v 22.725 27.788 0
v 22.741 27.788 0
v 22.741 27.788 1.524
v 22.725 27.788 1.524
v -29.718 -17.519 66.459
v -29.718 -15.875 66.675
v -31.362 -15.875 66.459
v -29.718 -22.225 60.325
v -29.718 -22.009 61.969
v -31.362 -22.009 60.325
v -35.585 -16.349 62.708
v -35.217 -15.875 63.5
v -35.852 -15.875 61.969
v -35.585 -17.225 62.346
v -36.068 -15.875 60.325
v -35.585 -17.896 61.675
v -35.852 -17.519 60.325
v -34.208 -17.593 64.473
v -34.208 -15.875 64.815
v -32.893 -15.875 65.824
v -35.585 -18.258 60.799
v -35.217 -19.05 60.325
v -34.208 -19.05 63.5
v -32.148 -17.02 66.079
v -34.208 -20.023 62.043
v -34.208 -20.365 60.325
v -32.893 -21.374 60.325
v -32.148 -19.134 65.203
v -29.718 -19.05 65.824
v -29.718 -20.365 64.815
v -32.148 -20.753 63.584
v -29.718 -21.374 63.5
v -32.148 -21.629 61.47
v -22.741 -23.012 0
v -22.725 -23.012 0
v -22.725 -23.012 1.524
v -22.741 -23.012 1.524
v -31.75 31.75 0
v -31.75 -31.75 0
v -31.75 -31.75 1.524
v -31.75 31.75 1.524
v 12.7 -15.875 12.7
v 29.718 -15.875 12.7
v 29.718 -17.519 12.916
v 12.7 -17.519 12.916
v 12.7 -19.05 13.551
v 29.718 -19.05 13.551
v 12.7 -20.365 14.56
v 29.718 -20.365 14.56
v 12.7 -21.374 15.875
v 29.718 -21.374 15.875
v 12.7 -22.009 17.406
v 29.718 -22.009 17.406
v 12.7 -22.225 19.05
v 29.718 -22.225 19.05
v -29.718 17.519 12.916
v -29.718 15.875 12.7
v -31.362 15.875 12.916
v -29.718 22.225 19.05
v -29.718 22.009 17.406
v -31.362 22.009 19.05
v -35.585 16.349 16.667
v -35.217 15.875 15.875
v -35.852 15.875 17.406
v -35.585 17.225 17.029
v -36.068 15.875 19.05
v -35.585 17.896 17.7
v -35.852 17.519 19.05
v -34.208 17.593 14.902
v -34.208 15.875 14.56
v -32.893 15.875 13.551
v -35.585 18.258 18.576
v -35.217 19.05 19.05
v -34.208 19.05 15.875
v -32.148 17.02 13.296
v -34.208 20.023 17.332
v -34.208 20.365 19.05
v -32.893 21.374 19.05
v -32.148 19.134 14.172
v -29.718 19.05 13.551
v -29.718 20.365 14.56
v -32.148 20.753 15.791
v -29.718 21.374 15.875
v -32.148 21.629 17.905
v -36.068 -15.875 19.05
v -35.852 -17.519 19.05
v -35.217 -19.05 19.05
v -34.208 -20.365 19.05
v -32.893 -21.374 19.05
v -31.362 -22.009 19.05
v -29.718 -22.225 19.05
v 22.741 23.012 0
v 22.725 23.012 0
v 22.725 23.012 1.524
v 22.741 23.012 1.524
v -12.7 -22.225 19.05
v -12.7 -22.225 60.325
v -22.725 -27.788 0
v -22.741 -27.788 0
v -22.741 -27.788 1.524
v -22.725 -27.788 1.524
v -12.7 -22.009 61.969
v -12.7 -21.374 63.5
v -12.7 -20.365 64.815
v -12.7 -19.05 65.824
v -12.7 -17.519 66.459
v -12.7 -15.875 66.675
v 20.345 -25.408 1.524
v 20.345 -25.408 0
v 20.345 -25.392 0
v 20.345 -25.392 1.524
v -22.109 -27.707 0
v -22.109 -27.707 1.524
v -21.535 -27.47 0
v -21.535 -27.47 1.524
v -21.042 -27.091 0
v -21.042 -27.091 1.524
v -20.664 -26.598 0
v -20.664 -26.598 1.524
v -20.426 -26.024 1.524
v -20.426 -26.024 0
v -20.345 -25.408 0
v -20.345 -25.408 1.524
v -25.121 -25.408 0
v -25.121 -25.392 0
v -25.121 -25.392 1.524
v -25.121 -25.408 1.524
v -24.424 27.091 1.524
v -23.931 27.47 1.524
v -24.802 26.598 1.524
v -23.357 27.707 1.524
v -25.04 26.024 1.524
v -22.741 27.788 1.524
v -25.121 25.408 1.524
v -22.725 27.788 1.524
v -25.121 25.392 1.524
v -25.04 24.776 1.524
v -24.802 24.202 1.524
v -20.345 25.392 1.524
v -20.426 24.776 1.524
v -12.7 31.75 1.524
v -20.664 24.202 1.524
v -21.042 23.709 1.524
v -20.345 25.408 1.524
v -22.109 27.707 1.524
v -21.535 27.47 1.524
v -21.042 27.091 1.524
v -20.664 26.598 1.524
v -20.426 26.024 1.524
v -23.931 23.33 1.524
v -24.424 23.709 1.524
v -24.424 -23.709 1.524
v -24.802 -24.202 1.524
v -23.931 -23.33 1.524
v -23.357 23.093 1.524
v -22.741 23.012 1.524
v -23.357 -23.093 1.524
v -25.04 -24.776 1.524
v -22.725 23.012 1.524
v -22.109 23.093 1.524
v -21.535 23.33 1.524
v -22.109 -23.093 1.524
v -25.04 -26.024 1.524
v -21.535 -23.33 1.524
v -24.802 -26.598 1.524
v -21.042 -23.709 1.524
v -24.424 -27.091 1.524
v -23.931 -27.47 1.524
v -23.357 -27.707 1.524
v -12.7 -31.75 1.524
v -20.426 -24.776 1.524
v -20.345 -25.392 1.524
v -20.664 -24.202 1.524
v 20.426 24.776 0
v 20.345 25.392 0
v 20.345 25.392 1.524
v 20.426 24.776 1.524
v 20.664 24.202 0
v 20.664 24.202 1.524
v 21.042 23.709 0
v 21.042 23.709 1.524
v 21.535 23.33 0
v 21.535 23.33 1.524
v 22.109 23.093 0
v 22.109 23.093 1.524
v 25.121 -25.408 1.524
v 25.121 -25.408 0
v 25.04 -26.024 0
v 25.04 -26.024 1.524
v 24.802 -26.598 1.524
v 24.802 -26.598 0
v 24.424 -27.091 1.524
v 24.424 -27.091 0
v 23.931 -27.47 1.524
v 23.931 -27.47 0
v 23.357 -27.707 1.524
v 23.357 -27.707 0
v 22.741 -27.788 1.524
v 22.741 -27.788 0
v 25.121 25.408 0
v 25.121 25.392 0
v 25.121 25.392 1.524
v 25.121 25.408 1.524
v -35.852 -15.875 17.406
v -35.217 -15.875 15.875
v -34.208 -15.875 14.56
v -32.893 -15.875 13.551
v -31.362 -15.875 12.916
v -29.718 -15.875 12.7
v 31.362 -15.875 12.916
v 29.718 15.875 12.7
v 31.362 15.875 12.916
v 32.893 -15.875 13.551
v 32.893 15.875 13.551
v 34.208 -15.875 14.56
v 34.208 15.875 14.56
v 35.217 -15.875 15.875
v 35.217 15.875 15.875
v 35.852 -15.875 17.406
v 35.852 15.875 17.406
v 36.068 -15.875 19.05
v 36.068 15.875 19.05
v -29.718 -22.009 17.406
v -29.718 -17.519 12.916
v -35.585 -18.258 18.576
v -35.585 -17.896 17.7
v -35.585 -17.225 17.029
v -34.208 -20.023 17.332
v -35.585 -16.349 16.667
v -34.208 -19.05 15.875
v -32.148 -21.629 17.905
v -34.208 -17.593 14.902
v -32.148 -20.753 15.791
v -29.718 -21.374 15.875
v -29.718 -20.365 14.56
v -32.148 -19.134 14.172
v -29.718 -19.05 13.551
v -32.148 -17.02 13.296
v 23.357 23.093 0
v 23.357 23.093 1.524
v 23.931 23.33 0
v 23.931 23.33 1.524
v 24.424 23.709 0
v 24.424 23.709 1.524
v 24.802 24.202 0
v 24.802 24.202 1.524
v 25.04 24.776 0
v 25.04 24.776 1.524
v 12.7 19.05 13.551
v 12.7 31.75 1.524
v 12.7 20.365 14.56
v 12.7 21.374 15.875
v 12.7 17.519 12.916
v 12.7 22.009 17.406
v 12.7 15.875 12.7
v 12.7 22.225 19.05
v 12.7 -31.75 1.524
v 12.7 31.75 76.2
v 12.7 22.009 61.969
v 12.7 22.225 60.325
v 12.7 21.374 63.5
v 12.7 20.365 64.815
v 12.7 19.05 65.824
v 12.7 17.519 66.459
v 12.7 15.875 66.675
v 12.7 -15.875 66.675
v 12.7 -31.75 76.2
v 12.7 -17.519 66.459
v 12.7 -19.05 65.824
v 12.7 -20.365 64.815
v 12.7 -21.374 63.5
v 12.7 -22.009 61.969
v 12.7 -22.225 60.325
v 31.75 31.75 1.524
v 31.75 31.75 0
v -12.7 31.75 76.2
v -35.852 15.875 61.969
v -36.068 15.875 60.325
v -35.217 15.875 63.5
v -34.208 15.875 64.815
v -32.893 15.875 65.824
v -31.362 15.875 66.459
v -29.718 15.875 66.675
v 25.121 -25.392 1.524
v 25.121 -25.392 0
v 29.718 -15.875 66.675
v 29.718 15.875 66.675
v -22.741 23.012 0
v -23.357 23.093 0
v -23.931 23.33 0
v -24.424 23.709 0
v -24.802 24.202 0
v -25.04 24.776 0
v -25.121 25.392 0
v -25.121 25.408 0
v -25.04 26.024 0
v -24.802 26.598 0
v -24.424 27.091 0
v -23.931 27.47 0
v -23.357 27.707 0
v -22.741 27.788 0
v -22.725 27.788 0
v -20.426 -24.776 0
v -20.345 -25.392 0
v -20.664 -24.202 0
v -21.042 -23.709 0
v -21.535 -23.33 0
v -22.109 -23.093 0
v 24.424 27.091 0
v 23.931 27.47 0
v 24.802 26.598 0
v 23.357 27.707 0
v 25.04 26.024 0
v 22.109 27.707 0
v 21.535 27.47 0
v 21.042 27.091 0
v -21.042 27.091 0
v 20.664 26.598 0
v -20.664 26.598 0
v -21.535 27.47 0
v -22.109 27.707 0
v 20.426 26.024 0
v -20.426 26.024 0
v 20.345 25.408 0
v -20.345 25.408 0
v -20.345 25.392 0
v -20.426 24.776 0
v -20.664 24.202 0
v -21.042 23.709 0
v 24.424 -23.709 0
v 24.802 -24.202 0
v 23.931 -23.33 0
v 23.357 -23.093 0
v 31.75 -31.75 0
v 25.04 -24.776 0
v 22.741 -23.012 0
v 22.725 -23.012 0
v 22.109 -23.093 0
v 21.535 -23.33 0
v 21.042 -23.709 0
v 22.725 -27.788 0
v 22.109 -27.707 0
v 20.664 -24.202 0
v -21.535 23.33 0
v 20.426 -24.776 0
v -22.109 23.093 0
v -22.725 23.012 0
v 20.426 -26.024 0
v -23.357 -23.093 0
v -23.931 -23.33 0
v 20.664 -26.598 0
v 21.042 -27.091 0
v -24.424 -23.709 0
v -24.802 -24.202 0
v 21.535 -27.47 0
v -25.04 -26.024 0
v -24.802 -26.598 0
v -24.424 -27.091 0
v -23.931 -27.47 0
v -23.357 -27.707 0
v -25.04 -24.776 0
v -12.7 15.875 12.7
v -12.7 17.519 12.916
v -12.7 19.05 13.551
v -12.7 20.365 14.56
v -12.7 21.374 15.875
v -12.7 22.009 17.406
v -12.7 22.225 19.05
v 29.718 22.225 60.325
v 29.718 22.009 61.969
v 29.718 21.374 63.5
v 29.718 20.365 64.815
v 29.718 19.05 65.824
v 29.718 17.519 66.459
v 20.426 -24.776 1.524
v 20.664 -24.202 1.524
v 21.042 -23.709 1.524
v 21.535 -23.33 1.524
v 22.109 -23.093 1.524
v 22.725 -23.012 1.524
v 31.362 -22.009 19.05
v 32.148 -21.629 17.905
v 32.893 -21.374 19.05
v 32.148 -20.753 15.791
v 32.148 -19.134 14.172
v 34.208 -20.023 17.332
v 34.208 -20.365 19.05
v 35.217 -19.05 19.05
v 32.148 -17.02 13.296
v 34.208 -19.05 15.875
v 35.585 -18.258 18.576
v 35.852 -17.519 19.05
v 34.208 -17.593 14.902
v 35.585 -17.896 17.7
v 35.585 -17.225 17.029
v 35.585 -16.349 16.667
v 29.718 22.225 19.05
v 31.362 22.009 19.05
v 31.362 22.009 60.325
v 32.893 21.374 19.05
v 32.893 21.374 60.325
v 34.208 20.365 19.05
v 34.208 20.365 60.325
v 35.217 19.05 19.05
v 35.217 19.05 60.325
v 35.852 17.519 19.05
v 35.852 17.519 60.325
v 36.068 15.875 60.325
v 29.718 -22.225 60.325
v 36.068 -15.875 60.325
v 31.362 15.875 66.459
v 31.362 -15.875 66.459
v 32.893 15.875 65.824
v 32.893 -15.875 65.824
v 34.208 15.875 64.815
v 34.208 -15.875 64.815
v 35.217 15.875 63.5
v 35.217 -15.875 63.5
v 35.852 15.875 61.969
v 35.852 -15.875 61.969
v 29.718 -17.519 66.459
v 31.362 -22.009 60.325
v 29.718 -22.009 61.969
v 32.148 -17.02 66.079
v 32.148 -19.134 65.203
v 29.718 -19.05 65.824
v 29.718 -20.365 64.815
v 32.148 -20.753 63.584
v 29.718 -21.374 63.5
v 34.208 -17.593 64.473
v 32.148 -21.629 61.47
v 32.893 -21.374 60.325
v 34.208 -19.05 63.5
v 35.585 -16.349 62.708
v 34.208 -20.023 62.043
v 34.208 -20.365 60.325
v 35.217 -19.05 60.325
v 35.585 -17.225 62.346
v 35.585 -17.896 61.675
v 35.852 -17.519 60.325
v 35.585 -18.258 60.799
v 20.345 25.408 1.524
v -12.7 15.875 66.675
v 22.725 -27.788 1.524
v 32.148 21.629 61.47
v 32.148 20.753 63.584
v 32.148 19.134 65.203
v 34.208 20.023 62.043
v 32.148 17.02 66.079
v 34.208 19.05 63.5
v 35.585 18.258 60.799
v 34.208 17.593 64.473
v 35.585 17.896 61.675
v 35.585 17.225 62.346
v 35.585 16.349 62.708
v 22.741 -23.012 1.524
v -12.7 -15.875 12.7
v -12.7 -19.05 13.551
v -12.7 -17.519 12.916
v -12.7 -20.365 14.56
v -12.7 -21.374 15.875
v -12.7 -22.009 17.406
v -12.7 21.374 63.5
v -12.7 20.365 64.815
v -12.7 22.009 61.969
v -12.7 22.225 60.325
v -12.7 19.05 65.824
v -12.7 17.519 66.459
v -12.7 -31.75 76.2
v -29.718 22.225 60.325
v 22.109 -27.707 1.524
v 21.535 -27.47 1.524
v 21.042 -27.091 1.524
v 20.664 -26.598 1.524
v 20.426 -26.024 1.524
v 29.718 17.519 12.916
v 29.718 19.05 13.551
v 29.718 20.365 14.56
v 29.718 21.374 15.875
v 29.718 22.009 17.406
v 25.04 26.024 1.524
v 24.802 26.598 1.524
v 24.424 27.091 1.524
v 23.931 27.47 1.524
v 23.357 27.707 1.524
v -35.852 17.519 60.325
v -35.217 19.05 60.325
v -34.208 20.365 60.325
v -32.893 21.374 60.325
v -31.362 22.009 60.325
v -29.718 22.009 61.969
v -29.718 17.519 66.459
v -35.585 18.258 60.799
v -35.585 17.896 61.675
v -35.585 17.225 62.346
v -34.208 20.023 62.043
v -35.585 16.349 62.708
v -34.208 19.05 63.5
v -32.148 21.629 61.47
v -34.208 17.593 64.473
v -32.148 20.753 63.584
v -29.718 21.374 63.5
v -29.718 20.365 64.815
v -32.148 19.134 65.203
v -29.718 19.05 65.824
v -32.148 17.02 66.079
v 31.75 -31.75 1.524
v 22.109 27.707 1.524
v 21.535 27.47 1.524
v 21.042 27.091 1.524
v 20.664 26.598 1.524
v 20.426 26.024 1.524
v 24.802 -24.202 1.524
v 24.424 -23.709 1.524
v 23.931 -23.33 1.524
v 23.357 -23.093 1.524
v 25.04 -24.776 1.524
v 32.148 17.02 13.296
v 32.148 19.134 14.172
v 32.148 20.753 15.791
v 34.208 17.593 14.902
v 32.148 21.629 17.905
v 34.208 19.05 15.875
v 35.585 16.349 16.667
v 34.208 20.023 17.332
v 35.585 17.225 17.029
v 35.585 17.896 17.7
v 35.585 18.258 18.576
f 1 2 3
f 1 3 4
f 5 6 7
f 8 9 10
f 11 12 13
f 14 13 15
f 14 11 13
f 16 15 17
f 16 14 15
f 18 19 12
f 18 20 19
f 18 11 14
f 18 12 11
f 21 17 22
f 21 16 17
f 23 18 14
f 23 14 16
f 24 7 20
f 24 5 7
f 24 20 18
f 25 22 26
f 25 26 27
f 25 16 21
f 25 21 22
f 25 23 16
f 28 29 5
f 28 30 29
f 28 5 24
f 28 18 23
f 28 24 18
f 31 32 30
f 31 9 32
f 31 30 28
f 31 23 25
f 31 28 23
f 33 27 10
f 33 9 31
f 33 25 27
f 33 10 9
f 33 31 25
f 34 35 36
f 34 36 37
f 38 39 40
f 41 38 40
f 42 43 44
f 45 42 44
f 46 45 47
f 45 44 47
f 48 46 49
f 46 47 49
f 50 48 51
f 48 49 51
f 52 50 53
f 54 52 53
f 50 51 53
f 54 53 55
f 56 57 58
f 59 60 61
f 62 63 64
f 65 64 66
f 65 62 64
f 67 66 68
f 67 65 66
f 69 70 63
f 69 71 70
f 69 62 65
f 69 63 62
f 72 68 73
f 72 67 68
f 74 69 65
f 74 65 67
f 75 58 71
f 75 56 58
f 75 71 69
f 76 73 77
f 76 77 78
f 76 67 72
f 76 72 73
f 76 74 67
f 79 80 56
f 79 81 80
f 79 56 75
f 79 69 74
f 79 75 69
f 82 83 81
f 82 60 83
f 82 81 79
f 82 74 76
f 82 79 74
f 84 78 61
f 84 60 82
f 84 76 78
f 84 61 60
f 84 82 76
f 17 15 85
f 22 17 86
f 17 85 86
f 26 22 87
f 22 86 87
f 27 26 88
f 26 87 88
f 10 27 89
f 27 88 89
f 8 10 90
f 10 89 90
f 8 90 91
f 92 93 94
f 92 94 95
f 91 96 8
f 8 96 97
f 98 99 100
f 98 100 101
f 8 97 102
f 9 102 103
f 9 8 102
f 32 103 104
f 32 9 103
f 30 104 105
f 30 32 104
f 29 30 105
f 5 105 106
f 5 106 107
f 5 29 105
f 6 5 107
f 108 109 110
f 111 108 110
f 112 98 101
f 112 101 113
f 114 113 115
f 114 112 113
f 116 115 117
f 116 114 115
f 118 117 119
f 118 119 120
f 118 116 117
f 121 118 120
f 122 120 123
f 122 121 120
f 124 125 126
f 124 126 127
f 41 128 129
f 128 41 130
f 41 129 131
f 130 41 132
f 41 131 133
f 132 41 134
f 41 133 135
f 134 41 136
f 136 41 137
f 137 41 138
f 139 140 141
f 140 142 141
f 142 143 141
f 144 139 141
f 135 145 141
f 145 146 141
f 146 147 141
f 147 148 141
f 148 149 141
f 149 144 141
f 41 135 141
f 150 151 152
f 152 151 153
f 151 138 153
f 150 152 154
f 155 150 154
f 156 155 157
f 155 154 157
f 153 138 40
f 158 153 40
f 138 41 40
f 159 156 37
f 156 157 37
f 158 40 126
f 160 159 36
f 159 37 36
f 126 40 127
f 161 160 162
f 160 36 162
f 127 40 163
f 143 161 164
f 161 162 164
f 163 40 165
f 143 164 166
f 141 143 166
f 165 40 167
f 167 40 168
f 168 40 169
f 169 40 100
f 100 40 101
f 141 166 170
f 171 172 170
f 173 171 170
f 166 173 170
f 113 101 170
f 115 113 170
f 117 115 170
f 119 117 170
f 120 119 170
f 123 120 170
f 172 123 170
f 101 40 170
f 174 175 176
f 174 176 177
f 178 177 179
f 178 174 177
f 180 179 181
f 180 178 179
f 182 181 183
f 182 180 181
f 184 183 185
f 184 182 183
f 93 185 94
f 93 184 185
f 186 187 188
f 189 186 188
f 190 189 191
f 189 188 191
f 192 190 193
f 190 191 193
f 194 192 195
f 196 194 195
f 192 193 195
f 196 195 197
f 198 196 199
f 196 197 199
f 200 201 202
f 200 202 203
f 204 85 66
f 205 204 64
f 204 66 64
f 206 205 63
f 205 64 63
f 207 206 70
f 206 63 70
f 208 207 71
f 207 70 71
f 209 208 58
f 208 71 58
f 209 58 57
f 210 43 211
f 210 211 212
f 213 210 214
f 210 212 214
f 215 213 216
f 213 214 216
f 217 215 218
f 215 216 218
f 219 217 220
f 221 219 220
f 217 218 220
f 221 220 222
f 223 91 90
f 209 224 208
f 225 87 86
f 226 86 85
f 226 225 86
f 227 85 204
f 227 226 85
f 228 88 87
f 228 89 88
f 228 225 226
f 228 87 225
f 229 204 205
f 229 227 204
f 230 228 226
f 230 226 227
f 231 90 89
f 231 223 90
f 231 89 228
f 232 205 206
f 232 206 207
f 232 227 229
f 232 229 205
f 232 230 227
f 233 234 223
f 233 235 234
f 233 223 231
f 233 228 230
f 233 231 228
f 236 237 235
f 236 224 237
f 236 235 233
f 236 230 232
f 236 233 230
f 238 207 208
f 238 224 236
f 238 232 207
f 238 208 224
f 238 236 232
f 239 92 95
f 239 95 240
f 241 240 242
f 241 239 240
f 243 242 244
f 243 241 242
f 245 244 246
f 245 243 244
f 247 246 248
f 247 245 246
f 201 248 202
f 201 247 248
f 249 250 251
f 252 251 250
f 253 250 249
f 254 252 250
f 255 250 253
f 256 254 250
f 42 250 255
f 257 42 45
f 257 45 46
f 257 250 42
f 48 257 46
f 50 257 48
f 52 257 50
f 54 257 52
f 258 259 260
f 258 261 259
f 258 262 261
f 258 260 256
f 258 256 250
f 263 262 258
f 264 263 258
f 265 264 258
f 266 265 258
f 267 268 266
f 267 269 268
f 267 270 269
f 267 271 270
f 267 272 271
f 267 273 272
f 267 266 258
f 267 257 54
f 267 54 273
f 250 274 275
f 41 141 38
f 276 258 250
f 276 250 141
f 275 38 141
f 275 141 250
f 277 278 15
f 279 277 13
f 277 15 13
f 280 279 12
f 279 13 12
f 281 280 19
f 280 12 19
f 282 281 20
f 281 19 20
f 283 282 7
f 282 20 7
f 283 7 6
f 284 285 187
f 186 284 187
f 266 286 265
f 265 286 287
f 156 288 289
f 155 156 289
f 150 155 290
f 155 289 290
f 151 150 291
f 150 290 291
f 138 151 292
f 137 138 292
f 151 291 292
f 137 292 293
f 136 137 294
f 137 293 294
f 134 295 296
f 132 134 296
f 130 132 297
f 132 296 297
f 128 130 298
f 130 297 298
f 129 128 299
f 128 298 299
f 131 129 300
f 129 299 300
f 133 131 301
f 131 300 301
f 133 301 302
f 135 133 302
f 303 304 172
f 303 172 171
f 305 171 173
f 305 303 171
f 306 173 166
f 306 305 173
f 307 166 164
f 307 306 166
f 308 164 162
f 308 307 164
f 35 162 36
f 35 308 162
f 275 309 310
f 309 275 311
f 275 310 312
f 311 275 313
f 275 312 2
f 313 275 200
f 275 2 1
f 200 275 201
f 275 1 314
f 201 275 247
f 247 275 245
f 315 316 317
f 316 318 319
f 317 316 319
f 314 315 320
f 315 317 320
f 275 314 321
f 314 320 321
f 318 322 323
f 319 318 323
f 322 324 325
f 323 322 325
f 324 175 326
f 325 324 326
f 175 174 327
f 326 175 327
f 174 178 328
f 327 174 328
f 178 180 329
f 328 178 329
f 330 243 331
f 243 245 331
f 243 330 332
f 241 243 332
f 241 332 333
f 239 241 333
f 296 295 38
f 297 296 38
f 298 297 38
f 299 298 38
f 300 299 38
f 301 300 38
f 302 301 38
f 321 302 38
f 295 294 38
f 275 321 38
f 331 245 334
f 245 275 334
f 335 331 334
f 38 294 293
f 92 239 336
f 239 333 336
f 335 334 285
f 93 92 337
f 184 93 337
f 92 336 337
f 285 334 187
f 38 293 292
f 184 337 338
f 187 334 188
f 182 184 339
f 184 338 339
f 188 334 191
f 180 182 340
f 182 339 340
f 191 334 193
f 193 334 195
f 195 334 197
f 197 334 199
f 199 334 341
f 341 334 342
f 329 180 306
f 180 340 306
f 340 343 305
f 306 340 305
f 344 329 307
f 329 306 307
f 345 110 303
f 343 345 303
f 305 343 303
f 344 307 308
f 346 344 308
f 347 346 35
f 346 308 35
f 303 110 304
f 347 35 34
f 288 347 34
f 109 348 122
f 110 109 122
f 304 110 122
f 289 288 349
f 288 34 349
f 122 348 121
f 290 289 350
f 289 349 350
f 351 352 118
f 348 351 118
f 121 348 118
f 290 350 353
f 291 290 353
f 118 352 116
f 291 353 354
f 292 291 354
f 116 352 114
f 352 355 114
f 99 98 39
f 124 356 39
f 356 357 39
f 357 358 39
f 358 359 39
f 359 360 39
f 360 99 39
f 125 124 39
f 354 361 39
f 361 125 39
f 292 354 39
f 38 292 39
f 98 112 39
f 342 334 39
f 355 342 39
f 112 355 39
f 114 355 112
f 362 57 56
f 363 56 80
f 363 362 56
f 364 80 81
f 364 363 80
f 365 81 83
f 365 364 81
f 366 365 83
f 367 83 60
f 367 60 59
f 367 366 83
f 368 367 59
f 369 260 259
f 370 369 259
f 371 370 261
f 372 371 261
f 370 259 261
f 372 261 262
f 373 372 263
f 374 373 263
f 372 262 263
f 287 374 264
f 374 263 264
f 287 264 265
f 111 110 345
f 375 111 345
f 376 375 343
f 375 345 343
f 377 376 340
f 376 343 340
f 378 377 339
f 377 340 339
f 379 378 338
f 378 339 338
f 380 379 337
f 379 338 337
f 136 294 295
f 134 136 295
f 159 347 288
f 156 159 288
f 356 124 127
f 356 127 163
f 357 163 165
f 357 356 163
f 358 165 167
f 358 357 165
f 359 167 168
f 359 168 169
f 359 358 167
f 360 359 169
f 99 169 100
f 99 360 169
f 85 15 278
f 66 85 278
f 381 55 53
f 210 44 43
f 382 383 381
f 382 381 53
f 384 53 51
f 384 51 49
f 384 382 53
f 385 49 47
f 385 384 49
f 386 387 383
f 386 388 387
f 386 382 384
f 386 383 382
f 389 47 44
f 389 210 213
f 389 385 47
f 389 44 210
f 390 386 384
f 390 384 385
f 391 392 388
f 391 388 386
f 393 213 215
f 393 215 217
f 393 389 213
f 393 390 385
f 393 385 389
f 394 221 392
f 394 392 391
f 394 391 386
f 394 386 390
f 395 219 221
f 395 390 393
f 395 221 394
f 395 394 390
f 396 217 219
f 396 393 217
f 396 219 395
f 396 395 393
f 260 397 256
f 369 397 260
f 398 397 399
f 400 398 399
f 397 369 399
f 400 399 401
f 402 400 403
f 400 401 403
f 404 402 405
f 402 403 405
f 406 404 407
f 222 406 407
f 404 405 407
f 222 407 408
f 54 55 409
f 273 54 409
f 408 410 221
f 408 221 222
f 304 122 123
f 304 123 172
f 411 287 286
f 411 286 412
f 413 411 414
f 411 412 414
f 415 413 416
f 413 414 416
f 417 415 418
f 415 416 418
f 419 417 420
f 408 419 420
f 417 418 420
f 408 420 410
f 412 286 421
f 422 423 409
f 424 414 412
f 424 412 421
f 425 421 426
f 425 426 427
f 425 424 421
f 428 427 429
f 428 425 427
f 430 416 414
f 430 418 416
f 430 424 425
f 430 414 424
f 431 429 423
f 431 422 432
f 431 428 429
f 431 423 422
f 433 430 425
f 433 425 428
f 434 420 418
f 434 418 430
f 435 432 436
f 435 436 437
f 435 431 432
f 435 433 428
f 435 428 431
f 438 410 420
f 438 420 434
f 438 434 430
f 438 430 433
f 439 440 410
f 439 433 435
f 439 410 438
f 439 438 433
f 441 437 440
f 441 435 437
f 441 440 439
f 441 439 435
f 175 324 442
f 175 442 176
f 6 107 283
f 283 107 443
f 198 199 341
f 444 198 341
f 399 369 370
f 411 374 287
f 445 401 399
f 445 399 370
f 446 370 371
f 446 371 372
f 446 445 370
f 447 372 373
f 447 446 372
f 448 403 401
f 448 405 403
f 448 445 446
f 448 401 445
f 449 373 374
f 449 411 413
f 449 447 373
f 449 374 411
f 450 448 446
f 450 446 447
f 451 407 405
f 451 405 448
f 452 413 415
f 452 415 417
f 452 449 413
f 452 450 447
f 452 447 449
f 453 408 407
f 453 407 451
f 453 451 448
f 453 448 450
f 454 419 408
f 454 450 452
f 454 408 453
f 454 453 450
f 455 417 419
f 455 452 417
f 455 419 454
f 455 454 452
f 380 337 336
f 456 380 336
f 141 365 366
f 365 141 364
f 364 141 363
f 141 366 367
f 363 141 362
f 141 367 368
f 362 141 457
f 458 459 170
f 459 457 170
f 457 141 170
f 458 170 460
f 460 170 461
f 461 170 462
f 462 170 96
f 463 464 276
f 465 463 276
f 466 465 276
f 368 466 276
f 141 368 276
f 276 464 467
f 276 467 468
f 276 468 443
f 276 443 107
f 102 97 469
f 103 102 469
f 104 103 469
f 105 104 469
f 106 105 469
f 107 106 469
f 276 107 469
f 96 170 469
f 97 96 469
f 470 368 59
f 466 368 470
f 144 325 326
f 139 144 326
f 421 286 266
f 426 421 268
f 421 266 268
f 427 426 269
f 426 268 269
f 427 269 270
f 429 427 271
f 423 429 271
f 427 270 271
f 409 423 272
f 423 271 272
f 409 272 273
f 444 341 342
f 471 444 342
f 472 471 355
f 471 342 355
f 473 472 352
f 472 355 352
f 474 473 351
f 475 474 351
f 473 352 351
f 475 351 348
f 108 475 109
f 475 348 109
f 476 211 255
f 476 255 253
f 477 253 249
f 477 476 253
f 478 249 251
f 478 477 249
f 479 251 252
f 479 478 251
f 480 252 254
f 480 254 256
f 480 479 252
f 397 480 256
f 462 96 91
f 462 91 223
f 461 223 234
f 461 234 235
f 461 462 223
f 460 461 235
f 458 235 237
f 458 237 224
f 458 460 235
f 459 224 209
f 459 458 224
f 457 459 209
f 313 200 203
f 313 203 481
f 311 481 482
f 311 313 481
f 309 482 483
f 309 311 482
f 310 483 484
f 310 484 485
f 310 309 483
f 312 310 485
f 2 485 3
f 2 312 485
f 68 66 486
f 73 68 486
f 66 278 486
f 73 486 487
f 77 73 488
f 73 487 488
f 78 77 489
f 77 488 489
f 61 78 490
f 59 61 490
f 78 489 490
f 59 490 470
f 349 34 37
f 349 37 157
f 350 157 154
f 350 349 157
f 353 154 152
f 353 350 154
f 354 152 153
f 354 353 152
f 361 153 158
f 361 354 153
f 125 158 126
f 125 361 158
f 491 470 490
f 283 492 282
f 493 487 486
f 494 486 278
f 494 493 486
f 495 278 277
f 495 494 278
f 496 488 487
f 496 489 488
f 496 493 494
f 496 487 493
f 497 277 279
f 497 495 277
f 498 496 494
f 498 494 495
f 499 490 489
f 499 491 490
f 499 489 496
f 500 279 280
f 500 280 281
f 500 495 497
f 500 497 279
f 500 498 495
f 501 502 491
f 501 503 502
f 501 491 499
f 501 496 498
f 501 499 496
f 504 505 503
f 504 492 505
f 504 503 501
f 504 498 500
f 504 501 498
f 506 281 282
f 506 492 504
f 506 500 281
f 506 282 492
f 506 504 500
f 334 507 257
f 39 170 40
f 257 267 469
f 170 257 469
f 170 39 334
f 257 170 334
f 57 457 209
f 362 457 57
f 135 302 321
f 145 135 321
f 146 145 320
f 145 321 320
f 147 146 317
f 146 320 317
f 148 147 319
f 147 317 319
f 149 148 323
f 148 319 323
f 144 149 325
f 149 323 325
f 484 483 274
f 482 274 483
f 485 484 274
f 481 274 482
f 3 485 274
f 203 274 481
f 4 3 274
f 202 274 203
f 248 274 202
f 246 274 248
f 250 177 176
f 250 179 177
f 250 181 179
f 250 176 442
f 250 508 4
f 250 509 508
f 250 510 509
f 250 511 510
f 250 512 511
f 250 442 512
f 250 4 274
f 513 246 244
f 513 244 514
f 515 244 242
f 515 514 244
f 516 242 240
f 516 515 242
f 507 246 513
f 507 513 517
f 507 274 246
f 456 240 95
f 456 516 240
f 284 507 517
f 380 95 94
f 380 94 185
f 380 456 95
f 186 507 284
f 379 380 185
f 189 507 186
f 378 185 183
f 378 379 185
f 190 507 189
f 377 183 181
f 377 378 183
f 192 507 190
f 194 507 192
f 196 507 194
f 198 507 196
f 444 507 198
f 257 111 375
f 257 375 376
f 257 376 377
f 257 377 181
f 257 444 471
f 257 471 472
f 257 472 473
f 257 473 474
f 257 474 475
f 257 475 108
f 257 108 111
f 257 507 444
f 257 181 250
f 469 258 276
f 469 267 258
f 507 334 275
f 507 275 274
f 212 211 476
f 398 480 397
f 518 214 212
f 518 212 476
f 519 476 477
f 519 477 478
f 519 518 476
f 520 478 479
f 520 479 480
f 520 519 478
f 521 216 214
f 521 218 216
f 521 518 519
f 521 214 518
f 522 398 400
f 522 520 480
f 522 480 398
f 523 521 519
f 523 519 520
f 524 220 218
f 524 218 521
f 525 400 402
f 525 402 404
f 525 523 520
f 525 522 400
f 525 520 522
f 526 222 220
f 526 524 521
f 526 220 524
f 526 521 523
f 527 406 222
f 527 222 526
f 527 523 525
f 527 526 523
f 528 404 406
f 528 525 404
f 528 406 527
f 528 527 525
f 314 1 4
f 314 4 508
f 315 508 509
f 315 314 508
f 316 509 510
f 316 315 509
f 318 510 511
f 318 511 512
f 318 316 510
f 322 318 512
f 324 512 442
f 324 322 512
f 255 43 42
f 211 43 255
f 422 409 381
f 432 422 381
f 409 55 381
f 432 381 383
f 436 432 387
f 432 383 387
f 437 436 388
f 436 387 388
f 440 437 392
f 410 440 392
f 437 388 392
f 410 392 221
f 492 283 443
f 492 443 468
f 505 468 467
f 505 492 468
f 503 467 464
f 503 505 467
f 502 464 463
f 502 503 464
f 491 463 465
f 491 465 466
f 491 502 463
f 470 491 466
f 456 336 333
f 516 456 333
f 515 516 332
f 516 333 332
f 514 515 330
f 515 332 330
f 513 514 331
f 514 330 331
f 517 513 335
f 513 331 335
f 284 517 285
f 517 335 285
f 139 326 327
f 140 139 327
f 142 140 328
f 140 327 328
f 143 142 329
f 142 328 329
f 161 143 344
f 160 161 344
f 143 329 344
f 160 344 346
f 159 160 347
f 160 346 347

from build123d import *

# Parameters (mm, degrees)
F0_W             = 12.7
F0_H             = 74.676
F0_W_2           = 19.05
F0_H_2           = 1.524
F1_DEPTH         = 31.75
F3_W             = 44.45
F3_H             = 53.975
F4_DEPTH         = 36.068
F6_DEPTH         = 1.524
F6_COPIES2_COUNT = 2
F6_COPIES2_PITCH = 68.174755
F7_R             = 6.35
F8_R             = 6.35


# Not quite as in the source:
# - a pattern or mirror of a feature is missing from the dataset's text; its kind, count and spacing are read off the source's solid


with BuildPart() as f1:
    # F0 (on Front) → F1 (new body, symmetric)
    with BuildSketch(Plane.XZ):
        with Locations((-6.35, 38.862)):
            Rectangle(F0_W, F0_H)
        with Locations((-22.225, 0.762)):
            Rectangle(F0_W_2, F0_H_2)
        with Locations((-6.35, 0.762)):
            Rectangle(F0_W, F0_H_2)
    extrude(amount=F1_DEPTH, both=True)

    # F2: F1 across plane


with BuildPart() as f1_1:
    add(f1.part)
    add(f1.part.mirror(Plane.YZ))

    # F3 (on Right) → F4 (join, symmetric)
    with BuildSketch(Plane.YZ):
        with Locations((0, 39.6875)):
            Rectangle(F3_W, F3_H)
    extrude(amount=F4_DEPTH, both=True)

    # F5 (on face) → F6 (cut, through all)
    with BuildSketch(Plane(origin=(0, 0, 0), x_dir=(1, 0, 0), z_dir=(0, 0, -1))):
        with BuildLine():
            Line((22.72538, 23.0116418839), (22.74062, 23.0116418839))
            ThreePointArc((22.74062, 23.0116418839), (24.4235199971, 23.7087218868), (25.1206, 25.3916218839))
            Line((25.1206, 25.3916218839), (25.1206, 25.4083781161))
            ThreePointArc((25.1206, 25.4083781161), (24.4235199971, 27.0912781132), (22.74062, 27.7883581161))
            Line((22.74062, 27.7883581161), (22.72538, 27.7883581161))
            ThreePointArc((22.72538, 27.7883581161), (21.0424800029, 27.0912781132), (20.3454, 25.4083781161))
            Line((20.3454, 25.4083781161), (20.3454, 25.3916218839))
            ThreePointArc((20.3454, 25.3916218839), (21.0424800029, 23.7087218868), (22.72538, 23.0116418839))
        make_face()
    f6 = extrude(amount=-F6_DEPTH, mode=Mode.SUBTRACT)

    # F6_copies: F6 across plane
    add(f6.mirror(Plane.ZX), mode=Mode.SUBTRACT)

    # F6_copies1: F6 across plane
    add(f6.mirror(Plane(origin=(0, 0, 0), x_dir=(0, 0, -1), z_dir=(-1, 0, 0))), mode=Mode.SUBTRACT)

    # F6_copies2: F6 ×2
    with Locations(*[Vector(-0.666903758, 0.7451438637, 0) * (i * F6_COPIES2_PITCH) for i in range(1, F6_COPIES2_COUNT)]):
        add(f6, mode=Mode.SUBTRACT)

    # F7
    f7_edges = [f1_1.edges().sort_by_distance(p)[0] for p in [
        (24.384, -22.225, 66.675),
        (24.384, 22.225, 66.675),
        (24.384, 22.225, 12.7),
        (24.384, -22.225, 12.7),
        (-24.384, -22.225, 12.7),
        (-24.384, -22.225, 66.675),
        (-24.384, 22.225, 66.675),
        (-24.384, 22.225, 12.7),
    ]]
    fillet(f7_edges, radius=F7_R)

    # F8
    f8_edges = [f1_1.edges().sort_by_distance(p)[0] for p in [
        (-36.068, 22.225, 39.6875),
        (-36.068, 20.365128, 14.559872),
        (-36.068, 20.365128, 64.815128),
        (-36.068, 0, 12.7),
        (-36.068, 0, 66.675),
        (-36.068, -20.365128, 14.559872),
        (-36.068, -20.365128, 64.815128),
        (-36.068, -22.225, 39.6875),
        (36.068, 22.225, 39.6875),
        (36.068, 20.365128, 14.559872),
        (36.068, 20.365128, 64.815128),
        (36.068, 0, 12.7),
        (36.068, 0, 66.675),
        (36.068, -20.365128, 14.559872),
        (36.068, -20.365128, 64.815128),
        (36.068, -22.225, 39.6875),
    ]]
    fillet(f8_edges, radius=F8_R)


solid = f1_1.part
